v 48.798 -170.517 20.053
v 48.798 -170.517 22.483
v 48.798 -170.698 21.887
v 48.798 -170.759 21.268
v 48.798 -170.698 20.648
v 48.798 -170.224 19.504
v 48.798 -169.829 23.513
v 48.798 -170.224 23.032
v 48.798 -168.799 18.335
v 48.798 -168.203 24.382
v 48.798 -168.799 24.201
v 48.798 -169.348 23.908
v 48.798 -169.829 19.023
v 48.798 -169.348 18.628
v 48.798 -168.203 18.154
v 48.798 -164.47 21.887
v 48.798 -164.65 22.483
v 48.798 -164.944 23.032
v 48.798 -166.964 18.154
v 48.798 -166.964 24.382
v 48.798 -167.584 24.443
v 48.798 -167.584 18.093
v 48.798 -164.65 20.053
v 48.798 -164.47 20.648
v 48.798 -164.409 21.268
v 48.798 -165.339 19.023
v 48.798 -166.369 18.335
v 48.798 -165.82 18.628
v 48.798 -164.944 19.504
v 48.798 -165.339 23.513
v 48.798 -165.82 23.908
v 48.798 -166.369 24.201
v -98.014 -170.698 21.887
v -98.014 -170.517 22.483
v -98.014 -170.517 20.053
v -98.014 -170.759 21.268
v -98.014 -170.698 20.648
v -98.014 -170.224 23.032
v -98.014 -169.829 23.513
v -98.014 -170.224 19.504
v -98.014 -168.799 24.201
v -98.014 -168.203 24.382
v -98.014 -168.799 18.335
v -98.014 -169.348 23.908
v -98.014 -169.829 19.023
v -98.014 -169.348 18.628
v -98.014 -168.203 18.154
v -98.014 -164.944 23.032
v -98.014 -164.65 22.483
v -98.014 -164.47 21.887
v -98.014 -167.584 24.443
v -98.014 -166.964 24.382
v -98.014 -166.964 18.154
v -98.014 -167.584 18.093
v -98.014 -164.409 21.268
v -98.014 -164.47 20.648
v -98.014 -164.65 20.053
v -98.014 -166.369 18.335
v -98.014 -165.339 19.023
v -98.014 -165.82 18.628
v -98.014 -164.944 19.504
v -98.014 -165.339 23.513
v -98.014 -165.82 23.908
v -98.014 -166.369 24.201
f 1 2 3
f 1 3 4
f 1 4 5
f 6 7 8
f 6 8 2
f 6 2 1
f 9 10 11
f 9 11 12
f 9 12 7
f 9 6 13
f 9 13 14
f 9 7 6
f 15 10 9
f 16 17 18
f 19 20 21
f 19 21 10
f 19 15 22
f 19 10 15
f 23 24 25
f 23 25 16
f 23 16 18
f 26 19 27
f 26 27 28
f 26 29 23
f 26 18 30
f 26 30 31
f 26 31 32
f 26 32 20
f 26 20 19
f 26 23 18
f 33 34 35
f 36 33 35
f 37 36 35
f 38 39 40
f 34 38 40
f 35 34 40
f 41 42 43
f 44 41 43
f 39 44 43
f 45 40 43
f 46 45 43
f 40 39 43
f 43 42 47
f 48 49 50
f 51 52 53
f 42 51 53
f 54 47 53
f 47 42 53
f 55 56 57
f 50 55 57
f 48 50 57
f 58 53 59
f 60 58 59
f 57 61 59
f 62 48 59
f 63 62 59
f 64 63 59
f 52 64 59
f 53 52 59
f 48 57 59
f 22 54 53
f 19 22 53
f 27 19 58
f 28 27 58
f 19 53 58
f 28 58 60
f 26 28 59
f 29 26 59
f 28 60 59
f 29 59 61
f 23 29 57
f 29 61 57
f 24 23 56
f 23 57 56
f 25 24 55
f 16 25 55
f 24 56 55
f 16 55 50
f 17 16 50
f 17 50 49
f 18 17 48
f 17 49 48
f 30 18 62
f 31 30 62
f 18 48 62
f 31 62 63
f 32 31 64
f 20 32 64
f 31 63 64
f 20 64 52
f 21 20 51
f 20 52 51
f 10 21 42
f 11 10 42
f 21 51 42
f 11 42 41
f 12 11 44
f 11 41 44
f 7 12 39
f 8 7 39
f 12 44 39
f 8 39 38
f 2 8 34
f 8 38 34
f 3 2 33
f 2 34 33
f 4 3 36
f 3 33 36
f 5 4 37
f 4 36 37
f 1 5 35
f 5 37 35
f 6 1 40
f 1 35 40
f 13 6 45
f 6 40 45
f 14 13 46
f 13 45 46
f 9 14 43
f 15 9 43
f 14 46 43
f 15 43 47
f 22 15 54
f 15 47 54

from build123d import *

# Parameters (mm, degrees)
BOSS_EXTRUDE2_OUTLINE_R = 3.175
BOSS_EXTRUDE2_DEPTH     = 146.812


# Read off the part's stored shape, not the designer's step: Boss-Extrude2
with BuildPart() as part:
    # Boss-Extrude2 outline → Boss-Extrude2 (new body)
    with BuildSketch(Plane(origin=(-98.013718438, 0, 0), x_dir=(0, 0, -1), z_dir=(1, 0, 0))):
        with Locations((-21.267819308, -167.583767489)):
            Circle(BOSS_EXTRUDE2_OUTLINE_R)
    extrude(amount=BOSS_EXTRUDE2_DEPTH)


solid = part.part
